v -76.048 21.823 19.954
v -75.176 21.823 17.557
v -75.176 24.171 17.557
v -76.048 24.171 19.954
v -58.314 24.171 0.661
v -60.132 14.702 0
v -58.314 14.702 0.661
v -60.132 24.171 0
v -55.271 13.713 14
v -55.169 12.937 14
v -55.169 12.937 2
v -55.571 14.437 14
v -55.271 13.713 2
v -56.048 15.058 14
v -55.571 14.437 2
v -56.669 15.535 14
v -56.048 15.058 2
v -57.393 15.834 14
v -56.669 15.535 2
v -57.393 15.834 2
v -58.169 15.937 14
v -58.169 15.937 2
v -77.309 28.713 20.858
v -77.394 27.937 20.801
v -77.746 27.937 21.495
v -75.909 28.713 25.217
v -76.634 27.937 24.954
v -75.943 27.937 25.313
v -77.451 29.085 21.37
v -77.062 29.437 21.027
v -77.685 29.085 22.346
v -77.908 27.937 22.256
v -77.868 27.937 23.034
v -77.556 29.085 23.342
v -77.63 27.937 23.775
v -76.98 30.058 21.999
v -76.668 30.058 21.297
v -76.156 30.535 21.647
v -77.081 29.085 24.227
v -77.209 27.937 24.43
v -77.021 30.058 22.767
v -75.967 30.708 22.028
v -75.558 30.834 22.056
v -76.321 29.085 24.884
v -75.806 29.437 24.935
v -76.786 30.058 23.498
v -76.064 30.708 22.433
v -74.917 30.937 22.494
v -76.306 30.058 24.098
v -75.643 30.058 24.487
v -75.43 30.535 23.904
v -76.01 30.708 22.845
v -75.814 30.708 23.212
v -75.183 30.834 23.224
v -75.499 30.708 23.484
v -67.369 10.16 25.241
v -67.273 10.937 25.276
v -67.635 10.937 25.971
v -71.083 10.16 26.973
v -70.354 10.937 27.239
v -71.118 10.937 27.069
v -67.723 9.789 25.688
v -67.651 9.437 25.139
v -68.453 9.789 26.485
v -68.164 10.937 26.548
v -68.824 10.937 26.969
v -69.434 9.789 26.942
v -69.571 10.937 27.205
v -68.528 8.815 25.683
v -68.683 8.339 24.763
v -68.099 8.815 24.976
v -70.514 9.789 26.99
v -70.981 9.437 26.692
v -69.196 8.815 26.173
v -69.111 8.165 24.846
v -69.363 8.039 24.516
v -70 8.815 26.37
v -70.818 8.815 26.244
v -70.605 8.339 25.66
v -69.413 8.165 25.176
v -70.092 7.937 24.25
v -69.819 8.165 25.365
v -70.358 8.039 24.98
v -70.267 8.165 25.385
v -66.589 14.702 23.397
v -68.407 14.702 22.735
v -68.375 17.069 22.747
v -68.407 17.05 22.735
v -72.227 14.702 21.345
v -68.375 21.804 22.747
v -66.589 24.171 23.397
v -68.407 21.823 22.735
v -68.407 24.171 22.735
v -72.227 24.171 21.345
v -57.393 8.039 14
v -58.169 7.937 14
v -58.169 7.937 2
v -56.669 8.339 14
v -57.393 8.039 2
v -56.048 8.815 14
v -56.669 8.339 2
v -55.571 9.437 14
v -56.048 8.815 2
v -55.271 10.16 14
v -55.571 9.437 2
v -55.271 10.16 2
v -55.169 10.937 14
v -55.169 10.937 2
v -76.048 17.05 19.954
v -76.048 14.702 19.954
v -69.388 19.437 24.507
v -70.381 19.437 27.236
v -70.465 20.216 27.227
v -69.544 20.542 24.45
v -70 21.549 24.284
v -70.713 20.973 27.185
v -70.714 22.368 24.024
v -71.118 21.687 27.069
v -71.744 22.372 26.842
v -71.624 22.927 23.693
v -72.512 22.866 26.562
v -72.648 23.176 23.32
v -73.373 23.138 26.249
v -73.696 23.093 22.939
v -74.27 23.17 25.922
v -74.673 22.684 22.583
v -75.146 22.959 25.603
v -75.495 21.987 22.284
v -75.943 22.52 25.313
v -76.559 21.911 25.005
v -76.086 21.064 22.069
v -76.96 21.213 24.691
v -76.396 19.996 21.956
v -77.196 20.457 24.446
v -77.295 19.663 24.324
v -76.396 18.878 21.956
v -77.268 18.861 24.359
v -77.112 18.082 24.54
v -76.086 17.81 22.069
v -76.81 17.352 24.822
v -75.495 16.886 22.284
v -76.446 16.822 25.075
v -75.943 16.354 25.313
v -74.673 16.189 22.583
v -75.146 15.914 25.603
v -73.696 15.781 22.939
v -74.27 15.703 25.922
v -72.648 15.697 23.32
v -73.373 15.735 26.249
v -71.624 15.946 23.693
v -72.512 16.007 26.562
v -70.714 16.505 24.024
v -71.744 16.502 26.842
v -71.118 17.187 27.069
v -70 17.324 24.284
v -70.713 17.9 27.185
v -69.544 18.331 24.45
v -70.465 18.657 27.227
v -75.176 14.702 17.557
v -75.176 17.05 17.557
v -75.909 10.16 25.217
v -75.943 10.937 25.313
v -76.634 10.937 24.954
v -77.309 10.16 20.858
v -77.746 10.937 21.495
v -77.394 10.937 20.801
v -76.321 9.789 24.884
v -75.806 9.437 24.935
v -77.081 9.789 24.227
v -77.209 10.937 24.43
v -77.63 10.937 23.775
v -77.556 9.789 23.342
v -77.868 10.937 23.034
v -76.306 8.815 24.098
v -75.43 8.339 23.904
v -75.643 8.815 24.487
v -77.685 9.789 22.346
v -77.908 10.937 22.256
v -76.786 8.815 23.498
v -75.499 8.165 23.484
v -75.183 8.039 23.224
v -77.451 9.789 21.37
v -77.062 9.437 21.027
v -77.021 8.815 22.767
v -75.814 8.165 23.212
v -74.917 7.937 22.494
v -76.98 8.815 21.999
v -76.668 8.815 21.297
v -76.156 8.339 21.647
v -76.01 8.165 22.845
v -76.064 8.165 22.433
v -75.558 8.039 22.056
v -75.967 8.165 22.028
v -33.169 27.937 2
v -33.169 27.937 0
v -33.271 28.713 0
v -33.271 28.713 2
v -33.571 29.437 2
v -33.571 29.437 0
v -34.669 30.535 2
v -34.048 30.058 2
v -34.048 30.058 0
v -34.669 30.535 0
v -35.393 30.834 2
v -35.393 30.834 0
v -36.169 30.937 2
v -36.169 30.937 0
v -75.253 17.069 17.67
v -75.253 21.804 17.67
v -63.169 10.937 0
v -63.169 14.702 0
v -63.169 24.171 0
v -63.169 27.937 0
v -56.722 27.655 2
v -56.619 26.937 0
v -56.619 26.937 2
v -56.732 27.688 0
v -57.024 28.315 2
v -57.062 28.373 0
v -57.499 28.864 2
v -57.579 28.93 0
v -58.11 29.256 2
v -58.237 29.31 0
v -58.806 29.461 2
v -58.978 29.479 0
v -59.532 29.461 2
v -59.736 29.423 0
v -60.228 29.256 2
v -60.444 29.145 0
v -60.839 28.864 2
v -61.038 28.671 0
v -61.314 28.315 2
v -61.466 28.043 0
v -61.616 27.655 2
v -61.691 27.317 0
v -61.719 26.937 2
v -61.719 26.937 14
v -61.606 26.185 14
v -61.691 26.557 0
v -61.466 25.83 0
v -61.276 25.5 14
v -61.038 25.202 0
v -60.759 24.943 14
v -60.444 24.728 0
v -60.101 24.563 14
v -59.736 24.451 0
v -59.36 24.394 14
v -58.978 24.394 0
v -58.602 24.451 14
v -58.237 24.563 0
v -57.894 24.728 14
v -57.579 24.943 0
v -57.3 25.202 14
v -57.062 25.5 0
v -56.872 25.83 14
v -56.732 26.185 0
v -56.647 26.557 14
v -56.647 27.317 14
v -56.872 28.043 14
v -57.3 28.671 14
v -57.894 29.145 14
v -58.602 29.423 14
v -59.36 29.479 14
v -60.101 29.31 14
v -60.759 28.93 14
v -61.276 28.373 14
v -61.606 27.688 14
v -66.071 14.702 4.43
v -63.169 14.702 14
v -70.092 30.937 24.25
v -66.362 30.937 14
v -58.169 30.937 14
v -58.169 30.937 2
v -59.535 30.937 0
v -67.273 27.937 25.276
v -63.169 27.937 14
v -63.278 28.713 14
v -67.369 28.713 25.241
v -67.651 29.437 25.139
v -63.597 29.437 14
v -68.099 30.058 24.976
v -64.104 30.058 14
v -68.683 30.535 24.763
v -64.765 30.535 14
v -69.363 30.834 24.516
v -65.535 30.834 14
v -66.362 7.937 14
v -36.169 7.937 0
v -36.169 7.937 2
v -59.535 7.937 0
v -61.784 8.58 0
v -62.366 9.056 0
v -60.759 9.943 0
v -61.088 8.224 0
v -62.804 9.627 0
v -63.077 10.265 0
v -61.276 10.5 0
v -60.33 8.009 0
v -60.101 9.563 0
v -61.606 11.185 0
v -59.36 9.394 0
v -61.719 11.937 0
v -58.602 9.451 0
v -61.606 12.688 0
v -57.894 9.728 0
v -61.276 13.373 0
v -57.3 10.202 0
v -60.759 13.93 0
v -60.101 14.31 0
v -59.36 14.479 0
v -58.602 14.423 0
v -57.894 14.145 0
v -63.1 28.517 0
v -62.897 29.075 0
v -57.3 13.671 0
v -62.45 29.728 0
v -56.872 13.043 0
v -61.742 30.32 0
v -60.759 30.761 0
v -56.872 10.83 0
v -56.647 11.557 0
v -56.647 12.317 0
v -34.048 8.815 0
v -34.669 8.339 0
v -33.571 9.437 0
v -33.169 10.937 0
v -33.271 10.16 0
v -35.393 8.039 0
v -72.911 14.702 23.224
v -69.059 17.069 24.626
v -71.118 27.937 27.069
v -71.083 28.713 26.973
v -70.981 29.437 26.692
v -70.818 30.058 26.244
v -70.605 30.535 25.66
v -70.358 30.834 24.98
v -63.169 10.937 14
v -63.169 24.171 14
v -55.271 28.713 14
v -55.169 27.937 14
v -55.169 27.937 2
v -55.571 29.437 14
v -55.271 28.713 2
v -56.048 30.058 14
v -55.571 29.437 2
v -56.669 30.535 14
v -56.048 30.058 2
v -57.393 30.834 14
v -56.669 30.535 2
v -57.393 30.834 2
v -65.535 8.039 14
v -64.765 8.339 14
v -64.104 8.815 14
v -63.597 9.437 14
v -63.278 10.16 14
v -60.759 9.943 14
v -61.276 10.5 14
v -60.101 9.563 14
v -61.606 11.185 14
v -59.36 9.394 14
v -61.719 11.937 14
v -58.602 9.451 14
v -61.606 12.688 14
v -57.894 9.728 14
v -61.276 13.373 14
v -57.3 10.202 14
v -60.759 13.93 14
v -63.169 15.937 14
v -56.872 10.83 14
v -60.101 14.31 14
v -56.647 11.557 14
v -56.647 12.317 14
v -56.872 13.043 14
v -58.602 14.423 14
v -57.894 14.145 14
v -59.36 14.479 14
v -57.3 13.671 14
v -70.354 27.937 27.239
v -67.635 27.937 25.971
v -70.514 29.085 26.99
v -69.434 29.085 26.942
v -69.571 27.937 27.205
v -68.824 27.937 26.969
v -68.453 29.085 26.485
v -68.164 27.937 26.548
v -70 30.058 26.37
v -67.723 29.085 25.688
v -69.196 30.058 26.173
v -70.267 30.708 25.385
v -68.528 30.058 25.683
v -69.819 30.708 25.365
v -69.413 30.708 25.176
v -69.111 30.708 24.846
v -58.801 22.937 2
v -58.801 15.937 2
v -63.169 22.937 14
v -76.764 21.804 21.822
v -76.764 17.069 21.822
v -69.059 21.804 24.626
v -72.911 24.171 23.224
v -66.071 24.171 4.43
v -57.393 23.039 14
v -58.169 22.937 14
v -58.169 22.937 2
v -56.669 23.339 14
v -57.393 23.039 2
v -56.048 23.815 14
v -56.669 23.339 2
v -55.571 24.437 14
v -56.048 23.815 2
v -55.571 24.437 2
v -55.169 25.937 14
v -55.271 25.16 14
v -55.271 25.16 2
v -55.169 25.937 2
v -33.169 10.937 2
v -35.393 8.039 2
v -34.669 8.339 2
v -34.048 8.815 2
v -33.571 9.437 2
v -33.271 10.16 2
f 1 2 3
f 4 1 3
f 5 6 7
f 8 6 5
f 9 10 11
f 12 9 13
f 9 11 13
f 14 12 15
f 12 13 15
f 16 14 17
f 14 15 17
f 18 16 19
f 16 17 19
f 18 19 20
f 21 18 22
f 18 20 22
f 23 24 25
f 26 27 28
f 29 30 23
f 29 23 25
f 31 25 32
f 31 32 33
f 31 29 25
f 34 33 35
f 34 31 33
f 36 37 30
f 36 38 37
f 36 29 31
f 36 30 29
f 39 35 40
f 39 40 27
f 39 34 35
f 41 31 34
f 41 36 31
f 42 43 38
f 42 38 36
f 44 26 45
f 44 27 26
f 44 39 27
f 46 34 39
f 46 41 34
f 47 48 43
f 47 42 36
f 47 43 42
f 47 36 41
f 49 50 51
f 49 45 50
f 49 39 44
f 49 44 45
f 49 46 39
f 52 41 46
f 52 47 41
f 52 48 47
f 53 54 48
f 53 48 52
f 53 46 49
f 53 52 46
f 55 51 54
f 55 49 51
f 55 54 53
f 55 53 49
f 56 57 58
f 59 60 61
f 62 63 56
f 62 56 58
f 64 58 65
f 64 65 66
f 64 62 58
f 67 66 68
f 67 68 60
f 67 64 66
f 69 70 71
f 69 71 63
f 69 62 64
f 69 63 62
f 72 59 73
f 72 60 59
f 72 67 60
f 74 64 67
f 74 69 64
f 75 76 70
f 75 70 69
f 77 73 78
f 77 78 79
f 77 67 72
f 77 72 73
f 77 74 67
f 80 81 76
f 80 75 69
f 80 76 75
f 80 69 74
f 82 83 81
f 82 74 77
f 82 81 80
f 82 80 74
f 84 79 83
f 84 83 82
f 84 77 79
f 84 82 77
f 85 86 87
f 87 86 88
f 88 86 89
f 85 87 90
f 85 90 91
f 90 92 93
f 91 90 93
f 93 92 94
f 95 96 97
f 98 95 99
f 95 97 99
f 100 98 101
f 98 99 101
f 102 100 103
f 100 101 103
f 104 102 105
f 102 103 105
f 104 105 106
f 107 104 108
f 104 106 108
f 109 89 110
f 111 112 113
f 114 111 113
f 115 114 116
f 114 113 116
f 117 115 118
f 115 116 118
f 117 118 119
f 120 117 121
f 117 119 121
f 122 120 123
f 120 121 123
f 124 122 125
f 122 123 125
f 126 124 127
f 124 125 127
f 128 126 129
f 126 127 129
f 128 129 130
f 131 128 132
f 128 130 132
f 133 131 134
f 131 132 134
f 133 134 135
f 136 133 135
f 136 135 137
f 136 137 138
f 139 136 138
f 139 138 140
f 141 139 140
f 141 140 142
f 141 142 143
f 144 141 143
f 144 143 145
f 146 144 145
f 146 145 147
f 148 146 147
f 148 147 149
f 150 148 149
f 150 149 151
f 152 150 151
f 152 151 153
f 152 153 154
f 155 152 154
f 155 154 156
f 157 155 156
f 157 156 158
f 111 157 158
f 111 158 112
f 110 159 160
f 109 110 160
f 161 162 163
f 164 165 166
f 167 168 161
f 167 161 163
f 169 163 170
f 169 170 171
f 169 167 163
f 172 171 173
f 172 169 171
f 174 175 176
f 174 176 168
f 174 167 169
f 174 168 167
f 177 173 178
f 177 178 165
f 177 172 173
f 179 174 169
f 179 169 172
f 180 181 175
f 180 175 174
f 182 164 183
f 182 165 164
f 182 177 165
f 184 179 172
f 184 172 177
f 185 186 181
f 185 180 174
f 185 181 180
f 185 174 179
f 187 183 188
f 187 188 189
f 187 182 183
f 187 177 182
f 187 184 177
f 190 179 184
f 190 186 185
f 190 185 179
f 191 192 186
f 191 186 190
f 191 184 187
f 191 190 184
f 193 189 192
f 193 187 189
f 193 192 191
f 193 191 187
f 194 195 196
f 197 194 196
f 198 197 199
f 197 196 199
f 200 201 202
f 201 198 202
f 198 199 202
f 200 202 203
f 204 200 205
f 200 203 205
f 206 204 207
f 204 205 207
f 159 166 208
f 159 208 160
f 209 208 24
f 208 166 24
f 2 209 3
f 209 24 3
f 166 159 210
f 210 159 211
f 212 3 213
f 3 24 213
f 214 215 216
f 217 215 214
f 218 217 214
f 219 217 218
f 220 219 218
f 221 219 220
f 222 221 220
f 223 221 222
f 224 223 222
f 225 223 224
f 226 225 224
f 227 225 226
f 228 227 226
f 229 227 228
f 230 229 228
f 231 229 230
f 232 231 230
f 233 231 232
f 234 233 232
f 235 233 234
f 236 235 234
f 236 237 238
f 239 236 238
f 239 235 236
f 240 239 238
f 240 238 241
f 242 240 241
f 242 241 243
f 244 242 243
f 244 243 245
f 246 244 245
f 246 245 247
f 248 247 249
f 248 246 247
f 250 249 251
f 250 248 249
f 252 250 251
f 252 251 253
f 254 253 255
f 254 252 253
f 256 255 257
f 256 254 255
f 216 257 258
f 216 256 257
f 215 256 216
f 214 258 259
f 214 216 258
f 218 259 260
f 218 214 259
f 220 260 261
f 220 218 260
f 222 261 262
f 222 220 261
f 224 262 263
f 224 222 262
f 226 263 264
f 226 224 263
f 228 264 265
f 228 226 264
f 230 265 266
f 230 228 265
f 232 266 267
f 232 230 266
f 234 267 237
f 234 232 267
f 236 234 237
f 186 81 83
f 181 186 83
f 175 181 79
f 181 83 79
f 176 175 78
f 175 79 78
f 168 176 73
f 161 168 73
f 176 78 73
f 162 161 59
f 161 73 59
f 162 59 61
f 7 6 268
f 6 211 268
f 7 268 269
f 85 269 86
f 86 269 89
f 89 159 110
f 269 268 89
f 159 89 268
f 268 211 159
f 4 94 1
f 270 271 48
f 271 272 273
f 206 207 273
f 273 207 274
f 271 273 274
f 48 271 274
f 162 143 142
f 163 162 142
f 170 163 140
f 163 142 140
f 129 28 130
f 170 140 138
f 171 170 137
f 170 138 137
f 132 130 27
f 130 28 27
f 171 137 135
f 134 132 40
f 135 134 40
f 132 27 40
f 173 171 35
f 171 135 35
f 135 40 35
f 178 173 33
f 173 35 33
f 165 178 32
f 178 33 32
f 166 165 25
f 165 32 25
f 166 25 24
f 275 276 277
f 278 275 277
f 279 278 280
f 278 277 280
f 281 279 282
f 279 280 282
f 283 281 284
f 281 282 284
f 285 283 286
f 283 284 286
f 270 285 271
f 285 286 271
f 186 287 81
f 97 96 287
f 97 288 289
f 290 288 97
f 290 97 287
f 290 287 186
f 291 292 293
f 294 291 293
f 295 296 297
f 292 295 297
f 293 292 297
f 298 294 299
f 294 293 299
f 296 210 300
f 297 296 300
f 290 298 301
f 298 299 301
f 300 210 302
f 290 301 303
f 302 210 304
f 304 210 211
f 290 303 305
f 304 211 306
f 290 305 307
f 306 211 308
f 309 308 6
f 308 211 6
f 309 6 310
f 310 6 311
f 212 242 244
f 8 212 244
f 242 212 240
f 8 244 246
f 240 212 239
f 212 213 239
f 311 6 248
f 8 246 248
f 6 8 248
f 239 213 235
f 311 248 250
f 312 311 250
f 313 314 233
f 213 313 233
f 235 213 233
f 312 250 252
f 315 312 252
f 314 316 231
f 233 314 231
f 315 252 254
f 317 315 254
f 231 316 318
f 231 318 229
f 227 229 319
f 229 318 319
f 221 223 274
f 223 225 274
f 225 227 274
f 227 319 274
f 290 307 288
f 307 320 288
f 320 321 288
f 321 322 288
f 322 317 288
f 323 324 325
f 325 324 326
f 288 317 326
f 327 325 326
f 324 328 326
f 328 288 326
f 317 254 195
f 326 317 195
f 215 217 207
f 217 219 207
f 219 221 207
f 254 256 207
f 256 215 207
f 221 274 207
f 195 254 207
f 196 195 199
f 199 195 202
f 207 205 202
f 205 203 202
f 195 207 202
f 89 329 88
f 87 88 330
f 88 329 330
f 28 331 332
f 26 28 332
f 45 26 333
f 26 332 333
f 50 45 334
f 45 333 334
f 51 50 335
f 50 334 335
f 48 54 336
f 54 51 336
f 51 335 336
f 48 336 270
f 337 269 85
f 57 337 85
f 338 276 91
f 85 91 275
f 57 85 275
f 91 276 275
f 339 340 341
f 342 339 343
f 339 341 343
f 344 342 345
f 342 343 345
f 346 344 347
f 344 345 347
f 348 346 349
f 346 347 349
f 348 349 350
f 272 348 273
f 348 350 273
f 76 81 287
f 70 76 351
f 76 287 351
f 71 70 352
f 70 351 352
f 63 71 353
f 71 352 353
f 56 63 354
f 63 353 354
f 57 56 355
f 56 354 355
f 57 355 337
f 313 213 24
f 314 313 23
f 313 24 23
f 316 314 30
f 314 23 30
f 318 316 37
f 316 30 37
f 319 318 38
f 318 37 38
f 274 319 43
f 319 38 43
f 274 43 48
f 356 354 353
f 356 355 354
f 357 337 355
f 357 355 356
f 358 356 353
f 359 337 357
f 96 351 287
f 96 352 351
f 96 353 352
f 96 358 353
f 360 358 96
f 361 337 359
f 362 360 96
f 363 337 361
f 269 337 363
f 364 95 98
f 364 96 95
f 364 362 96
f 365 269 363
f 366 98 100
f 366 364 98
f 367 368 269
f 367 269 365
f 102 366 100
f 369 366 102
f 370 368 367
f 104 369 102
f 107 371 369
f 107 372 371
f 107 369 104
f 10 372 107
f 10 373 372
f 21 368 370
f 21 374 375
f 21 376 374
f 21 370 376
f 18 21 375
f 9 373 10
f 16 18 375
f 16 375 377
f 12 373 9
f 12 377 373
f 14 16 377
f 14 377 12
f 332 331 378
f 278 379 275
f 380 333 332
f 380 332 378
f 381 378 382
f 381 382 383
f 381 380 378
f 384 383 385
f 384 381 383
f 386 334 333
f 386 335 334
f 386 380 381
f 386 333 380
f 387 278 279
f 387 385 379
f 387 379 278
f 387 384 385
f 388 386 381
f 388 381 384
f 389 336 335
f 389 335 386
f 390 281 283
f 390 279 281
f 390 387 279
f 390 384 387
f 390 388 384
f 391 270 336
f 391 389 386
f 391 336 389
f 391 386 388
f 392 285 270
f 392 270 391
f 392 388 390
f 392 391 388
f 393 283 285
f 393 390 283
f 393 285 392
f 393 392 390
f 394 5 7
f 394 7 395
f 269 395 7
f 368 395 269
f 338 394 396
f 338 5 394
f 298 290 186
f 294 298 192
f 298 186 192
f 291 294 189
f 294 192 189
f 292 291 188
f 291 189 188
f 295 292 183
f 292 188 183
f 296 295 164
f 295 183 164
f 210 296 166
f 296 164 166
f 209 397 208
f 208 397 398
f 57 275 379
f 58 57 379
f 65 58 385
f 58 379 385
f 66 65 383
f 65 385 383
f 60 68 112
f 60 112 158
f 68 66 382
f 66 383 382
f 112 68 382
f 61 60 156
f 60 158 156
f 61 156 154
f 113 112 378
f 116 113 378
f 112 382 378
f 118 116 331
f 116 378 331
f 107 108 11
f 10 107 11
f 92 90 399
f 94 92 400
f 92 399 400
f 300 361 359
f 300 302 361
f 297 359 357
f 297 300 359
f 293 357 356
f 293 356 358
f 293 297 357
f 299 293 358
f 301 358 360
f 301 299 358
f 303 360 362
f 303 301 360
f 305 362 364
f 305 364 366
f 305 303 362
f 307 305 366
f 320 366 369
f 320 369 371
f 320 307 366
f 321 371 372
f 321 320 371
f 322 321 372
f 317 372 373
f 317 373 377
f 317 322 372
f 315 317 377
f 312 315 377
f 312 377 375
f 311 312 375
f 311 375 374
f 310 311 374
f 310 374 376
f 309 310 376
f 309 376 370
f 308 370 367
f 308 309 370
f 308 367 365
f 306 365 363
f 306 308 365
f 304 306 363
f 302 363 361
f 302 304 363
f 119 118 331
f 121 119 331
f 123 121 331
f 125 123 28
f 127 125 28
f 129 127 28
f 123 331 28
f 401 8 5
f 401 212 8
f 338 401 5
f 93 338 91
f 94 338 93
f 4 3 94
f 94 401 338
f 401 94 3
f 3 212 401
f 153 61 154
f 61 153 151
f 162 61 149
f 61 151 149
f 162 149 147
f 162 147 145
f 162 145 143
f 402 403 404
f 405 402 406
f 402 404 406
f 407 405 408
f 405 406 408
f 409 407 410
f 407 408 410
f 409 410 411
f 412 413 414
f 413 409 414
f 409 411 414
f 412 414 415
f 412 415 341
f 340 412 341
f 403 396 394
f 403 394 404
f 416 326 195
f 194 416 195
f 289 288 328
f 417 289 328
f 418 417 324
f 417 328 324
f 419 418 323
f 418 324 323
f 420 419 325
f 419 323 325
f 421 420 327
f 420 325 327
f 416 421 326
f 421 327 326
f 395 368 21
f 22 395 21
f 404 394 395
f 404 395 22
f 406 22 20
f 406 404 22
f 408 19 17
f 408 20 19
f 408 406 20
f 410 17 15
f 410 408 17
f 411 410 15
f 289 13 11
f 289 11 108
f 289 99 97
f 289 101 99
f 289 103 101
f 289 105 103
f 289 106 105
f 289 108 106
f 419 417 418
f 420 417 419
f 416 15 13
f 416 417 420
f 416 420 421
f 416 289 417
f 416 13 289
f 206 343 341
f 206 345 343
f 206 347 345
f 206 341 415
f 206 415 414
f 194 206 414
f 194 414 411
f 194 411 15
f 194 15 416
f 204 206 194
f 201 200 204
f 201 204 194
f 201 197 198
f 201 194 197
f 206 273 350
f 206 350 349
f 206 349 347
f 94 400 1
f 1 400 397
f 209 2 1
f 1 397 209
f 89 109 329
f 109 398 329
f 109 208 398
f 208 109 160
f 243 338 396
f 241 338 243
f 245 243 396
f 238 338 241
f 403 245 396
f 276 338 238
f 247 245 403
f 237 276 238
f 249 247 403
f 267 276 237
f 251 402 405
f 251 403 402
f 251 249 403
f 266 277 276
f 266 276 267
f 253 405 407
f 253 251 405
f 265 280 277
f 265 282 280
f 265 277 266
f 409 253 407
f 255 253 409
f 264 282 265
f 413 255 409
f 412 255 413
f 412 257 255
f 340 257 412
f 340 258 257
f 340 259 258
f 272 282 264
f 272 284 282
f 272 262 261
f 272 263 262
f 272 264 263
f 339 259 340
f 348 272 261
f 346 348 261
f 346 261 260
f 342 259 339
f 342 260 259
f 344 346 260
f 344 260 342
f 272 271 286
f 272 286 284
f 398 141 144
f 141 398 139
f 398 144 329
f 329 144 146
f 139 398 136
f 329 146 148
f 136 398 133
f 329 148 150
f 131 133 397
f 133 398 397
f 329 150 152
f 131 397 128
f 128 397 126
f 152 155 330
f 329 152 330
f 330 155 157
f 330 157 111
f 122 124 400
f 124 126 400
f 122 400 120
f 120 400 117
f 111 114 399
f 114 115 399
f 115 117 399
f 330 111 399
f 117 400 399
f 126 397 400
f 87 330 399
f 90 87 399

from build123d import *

# Parameters (mm, degrees)
CROQUIS3_W              = 30
CROQUIS3_H              = 23
CROQUIS3_R              = 2.55
SALIENTE_EXTRUIR2_DEPTH = 2
CROQUIS5_W              = 8
CROQUIS5_H              = 8
CROQUIS5_R              = 2.55
SALIENTE_EXTRUIR3_DEPTH = 12
SALIENTE_EXTRUIR4_DEPTH = 23
CROQUIS7_R              = 3.75
CORTAR_EXTRUIR1_DEPTH   = 15
CORTAR_EXTRUIR7_START   = -3
CORTAR_EXTRUIR7_DEPTH   = 20
CORTAR_EXTRUIR8_START   = 2
CROQUIS14_W             = 8.13201816
CROQUIS14_H             = 9.468544415
CORTAR_EXTRUIR8_DEPTH   = 25
CROQUIS15_W             = 24.194573687
CROQUIS15_H             = 9.468544415
CORTAR_EXTRUIR9_DEPTH   = 1.933991
REDONDEO1_R             = 3


with BuildPart() as part:
    # Croquis3 → Saliente-Extruir2 (new body)
    with BuildSketch(Plane.XY):
        with Locations((-48.169014085, 19.436619718)):
            Rectangle(CROQUIS3_W, CROQUIS3_H)
        with Locations((-59.169014085, 26.936619718)):
            Circle(CROQUIS3_R, mode=Mode.SUBTRACT)
        with Locations(Location((-59.169014085, 11.936619718, 0), (0, 0, 180))):
            Circle(CROQUIS3_R, mode=Mode.SUBTRACT)
    extrude(amount=SALIENTE_EXTRUIR2_DEPTH)

    # Croquis5 → Saliente-Extruir3 (add)
    # profile 1 of 2: a face of its own
    with BuildSketch(Plane.XY.offset(2)):
        with Locations((-59.169014085, 11.936619718)):
            Rectangle(CROQUIS5_W, CROQUIS5_H)
        with Locations(Location((-59.169014085, 11.936619718, 0), (0, 0, 180))):
            Circle(CROQUIS5_R, mode=Mode.SUBTRACT)
    # profile 2 of 2: a face of its own
    with BuildSketch(Plane.XY.offset(2)):
        with Locations((-59.169014085, 26.936619718)):
            Rectangle(CROQUIS5_W, CROQUIS5_H)
        with Locations(Location((-59.169014085, 26.936619718, 0), (0, 0, 180))):
            Circle(CROQUIS5_R, mode=Mode.SUBTRACT)
    extrude(amount=SALIENTE_EXTRUIR3_DEPTH)

    # Croquis6 → Saliente-Extruir4 (add)
    with BuildSketch(Plane(origin=(0, 30.936619718, 0), x_dir=(1, 0, 0), z_dir=(0, 1, 0))):
        Polygon((-63.169014085, -14), (-68.299316234, -28.095389312), (-79.575627684, -23.991147592), (-63.169014085, 0), align=None)
    extrude(amount=-SALIENTE_EXTRUIR4_DEPTH)

    # Croquis7 → Cortar-Extruir1 (cut)
    with BuildSketch(Plane(origin=(-17.019186352, 0, 46.759830198), x_dir=(0.9396926207859082, 0, 0.3420201433256694), z_dir=(-0.3420201433256694, 0, 0.9396926207859083))):
        with Locations((-60.571174391, 19.436619718)):
            Circle(CROQUIS7_R)
    extrude(amount=-CORTAR_EXTRUIR1_DEPTH, mode=Mode.SUBTRACT)

    # Croquis13 → Cortar-Extruir7 (cut)
    with BuildSketch(Plane(origin=(-17.019186352, 0, 46.759830198), x_dir=(0.9396926207859082, 0, 0.3420201433256694), z_dir=(-0.3420201433256694, 0, 0.9396926207859083)).offset(CORTAR_EXTRUIR7_START)):
        Polygon((-60.571174391, 14.702347511), (-56.471174391, 17.069483615), (-56.471174391, 21.803755822), (-60.571174391, 24.170891926), (-64.671174391, 21.803755822), (-64.671174391, 17.069483615), align=None)
    extrude(amount=-CORTAR_EXTRUIR7_DEPTH, mode=Mode.SUBTRACT)

    # Croquis14 → Cortar-Extruir8 (cut)
    with BuildSketch(Plane(origin=(-15.993125922, 0, 43.940752336), x_dir=(-0.9396926207859081, 0, -0.34202014332566977), z_dir=(0.3420201433256697, 0, -0.939692620785908)).offset(CORTAR_EXTRUIR8_START)):
        with Locations((60.571174391, 19.436619719)):
            Rectangle(CROQUIS14_W, CROQUIS14_H)
    extrude(amount=CORTAR_EXTRUIR8_DEPTH, mode=Mode.SUBTRACT)

    # Croquis15 → Cortar-Extruir9 (cut)
    with BuildSketch(Plane(origin=(-53.097486879, 0, -19.325904738), x_dir=(-0.34202014332566977, 0, 0.9396926207859081), z_dir=(-0.939692620785908, 0, -0.3420201433256697))):
        with Locations((32.663485099, 19.436619719)):
            Rectangle(CROQUIS15_W, CROQUIS15_H)
    extrude(amount=-CORTAR_EXTRUIR9_DEPTH, mode=Mode.SUBTRACT)

    # Redondeo1
    # the kernel refuses this fillet: 3 mm, written as the material it takes off along each edge
    with BuildSketch(Plane(origin=(-70.092333667, 10.936619718, 24.250251019), x_dir=(0.9396926207859081, 0, 0.34202014332566966), z_dir=(0, -1, 0))) as redondeo1_piece_1_section:
        Polygon((0, 0), (REDONDEO1_R * 1.02, 0), (REDONDEO1_R * 1.02, REDONDEO1_R * 1.02), (0, REDONDEO1_R * 1.02), align=None)
    redondeo1_piece_1 = extrude(amount=REDONDEO1_R * 1.02, mode=Mode.PRIVATE)
    redondeo1_piece_1 = redondeo1_piece_1 - Plane(origin=(-70.092333667, 10.936619718, 24.250251019), x_dir=(-0.4226182617406987, 0, -0.9063077870366504), z_dir=(0, -1, 0)) * Sphere(REDONDEO1_R, mode=Mode.PRIVATE)
    add(redondeo1_piece_1, mode=Mode.SUBTRACT)
    with BuildSketch(Plane(origin=(-74.917413437, 10.936619718, 22.494065605), x_dir=(-0.3420201433256695, 0, 0.9396926207859081), z_dir=(0, -1, 0))) as redondeo1_piece_2_section:
        Polygon((0, 0), (REDONDEO1_R * 1.02, 0), (REDONDEO1_R * 1.02, REDONDEO1_R * 1.31418750187), (-REDONDEO1_R * 0.253089576506, REDONDEO1_R * 0.988102052555), align=None)
    redondeo1_piece_2 = extrude(amount=REDONDEO1_R * 1.02, mode=Mode.PRIVATE)
    redondeo1_piece_2 = redondeo1_piece_2 - Plane(origin=(-74.917413437, 10.936619718, 22.494065605), x_dir=(0.9520405381935744, 0, -0.30597191641732324), z_dir=(0, -1, 0)) * Sphere(REDONDEO1_R, mode=Mode.PRIVATE)
    add(redondeo1_piece_2, mode=Mode.SUBTRACT)
    with BuildSketch(Plane(origin=(-70.092333667, 27.936619718, 24.250251019), x_dir=(0.9396926207859081, 0, 0.34202014332566966), z_dir=(0, 1, 0))) as redondeo1_piece_3_section:
        Polygon((0, 0), (REDONDEO1_R * 1.02, 0), (REDONDEO1_R * 1.02, -REDONDEO1_R * 1.02), (0, -REDONDEO1_R * 1.02), align=None)
    redondeo1_piece_3 = extrude(amount=REDONDEO1_R * 1.02, mode=Mode.PRIVATE)
    redondeo1_piece_3 = redondeo1_piece_3 - Plane(origin=(-70.092333667, 27.936619718, 24.250251019), x_dir=(-0.4226182617406987, 0, -0.9063077870366504), z_dir=(0, 1, 0)) * Sphere(REDONDEO1_R, mode=Mode.PRIVATE)
    add(redondeo1_piece_3, mode=Mode.SUBTRACT)
    with BuildSketch(Plane(origin=(-74.917413437, 27.936619718, 22.494065605), x_dir=(-0.3420201433256695, 0, 0.9396926207859081), z_dir=(0, 1, 0))) as redondeo1_piece_4_section:
        Polygon((0, 0), (REDONDEO1_R * 1.02, 0), (REDONDEO1_R * 1.02, -REDONDEO1_R * 1.31418750187), (-REDONDEO1_R * 0.253089576506, -REDONDEO1_R * 0.988102052555), align=None)
    redondeo1_piece_4 = extrude(amount=REDONDEO1_R * 1.02, mode=Mode.PRIVATE)
    redondeo1_piece_4 = redondeo1_piece_4 - Plane(origin=(-74.917413437, 27.936619718, 22.494065605), x_dir=(0.9520405381935744, 0, -0.30597191641732324), z_dir=(0, 1, 0)) * Sphere(REDONDEO1_R, mode=Mode.PRIVATE)
    add(redondeo1_piece_4, mode=Mode.SUBTRACT)
    with BuildSketch(Plane(origin=(-55.169014085, 7.936619718, 2), x_dir=(0, 1, 0), z_dir=(0, 0, 1)), Plane(origin=(-55.169014085, 15.936619718, 2), x_dir=(-1, 0, 0), z_dir=(0, 0, 1)), Plane(origin=(-55.169014085, 30.936619718, 2), x_dir=(-1, 0, 0), z_dir=(0, 0, 1))) as redondeo1_piece_5:
        with BuildLine():
            CenterArc((REDONDEO1_R, REDONDEO1_R), REDONDEO1_R, 180, 90)
            Line((0, REDONDEO1_R), (0, 0))
            Line((0, 0), (REDONDEO1_R, 0))
        make_face()
    extrude(amount=19.5, mode=Mode.SUBTRACT)
    with BuildSketch(Plane(origin=(-55.169014085, 22.936619718, 2), x_dir=(-1, 0, 0), z_dir=(0, 0, 1))) as redondeo1_piece_6:
        with BuildLine():
            CenterArc((REDONDEO1_R, -REDONDEO1_R), REDONDEO1_R, 90, 90)
            Line((0, -REDONDEO1_R), (0, 0))
            Line((0, 0), (REDONDEO1_R, 0))
        make_face()
    extrude(amount=19.5, mode=Mode.SUBTRACT)
    with BuildSketch(Plane(origin=(-60.60386301, 7.936619718, 6.952305344), x_dir=(0, 1, 0), z_dir=(-0.34202014332566966, 0, 0.9396926207859081))) as redondeo1_piece_7_section:
        with BuildLine():
            CenterArc((REDONDEO1_R, REDONDEO1_R), REDONDEO1_R, 180, 90)
            Line((0, REDONDEO1_R), (0, 0))
            Line((0, 0), (REDONDEO1_R, 0))
        make_face()
    redondeo1_piece_7 = extrude(amount=19.5, mode=Mode.PRIVATE)
    redondeo1_piece_7 = split(redondeo1_piece_7, bisect_by=Plane(origin=(-65.882719938, 8.612486754, 14), z_dir=(0, 0, 1)), keep=Keep.TOP, mode=Mode.PRIVATE)
    add(redondeo1_piece_7, mode=Mode.SUBTRACT)
    with BuildSketch(Plane(origin=(-71.118394097, 7.936619718, 27.069328882), x_dir=(0.3420201433256695, 0, -0.9396926207859081), z_dir=(-0.9396926207859081, 0, -0.3420201433256695))) as redondeo1_piece_8:
        with BuildLine():
            CenterArc((REDONDEO1_R, -REDONDEO1_R), REDONDEO1_R, 90, 90)
            Line((0, -REDONDEO1_R), (0, 0))
            Line((0, 0), (REDONDEO1_R, 0))
        make_face()
    extrude(amount=5.134742642, mode=Mode.SUBTRACT)
    with BuildSketch(Plane(origin=(-68.299316234, 27.936619718, 28.095389312), x_dir=(0.34202014332566905, 0, -0.9396926207859082), z_dir=(0, -1, 0)), Plane(origin=(-33.169014085, 7.936619718, -7.5), x_dir=(-1, 0, 0), z_dir=(0, 0, 1))) as redondeo1_piece_9:
        with BuildLine():
            CenterArc((REDONDEO1_R, -REDONDEO1_R), REDONDEO1_R, 90, 90)
            Line((0, -REDONDEO1_R), (0, 0))
            Line((0, 0), (REDONDEO1_R, 0))
        make_face()
    extrude(amount=17, mode=Mode.SUBTRACT)
    with BuildSketch(Plane(origin=(-77.393738361, 7.936619718, 20.800603214), x_dir=(0.8254416413123481, 0, 0.5644874638001954), z_dir=(0.5644874638001954, 0, -0.8254416413123482))) as redondeo1_piece_10:
        with BuildLine():
            CenterArc((REDONDEO1_R, -REDONDEO1_R), REDONDEO1_R, 90, 90)
            Line((0, -REDONDEO1_R), (0, 0))
            Line((0, 0), (REDONDEO1_R, 0))
        make_face()
    extrude(amount=32.699362587, mode=Mode.SUBTRACT)
    with BuildSketch(Plane(origin=(-79.575627684, 27.936619718, 23.991147592), x_dir=(0.9396926207859081, 0, 0.3420201433256696), z_dir=(0, -1, 0))) as redondeo1_piece_11:
        with BuildLine():
            CenterArc((REDONDEO1_R * 1.28841911948, -REDONDEO1_R), REDONDEO1_R, 90, 104.366707449)
            Line((REDONDEO1_R * 0.319691616972, -REDONDEO1_R * 1.24812703579), (0, 0))
            Line((0, 0), (REDONDEO1_R * 1.28841911948, 0))
        make_face()
    extrude(amount=17, mode=Mode.SUBTRACT)
    with BuildSketch(Plane(origin=(-77.393738361, 30.936619718, 20.800603214), x_dir=(0.8254416413123481, 0, 0.5644874638001954), z_dir=(0.5644874638001954, 0, -0.8254416413123482))) as redondeo1_piece_12:
        with BuildLine():
            CenterArc((REDONDEO1_R, REDONDEO1_R), REDONDEO1_R, 180, 90)
            Line((0, REDONDEO1_R), (0, 0))
            Line((0, 0), (REDONDEO1_R, 0))
        make_face()
    extrude(amount=32.699362587, mode=Mode.SUBTRACT)
    with BuildSketch(Plane(origin=(-71.118394097, 30.936619718, 27.069328882), x_dir=(0.3420201433256695, 0, -0.9396926207859081), z_dir=(-0.9396926207859081, 0, -0.3420201433256695))) as redondeo1_piece_13:
        with BuildLine():
            CenterArc((REDONDEO1_R, REDONDEO1_R), REDONDEO1_R, 180, 90)
            Line((0, REDONDEO1_R), (0, 0))
            Line((0, 0), (REDONDEO1_R, 0))
        make_face()
    extrude(amount=5.134742642, mode=Mode.SUBTRACT)
    with BuildSketch(Plane(origin=(-60.60386301, 30.936619718, 6.952305344), x_dir=(-0.9396926207859081, 0, -0.3420201433256697), z_dir=(-0.34202014332566966, 0, 0.9396926207859081))) as redondeo1_piece_14_section:
        with BuildLine():
            CenterArc((REDONDEO1_R, REDONDEO1_R), REDONDEO1_R, 180, 90)
            Line((0, REDONDEO1_R), (0, 0))
            Line((0, 0), (REDONDEO1_R, 0))
        make_face()
    redondeo1_piece_14 = extrude(amount=19.5, mode=Mode.PRIVATE)
    redondeo1_piece_14 = split(redondeo1_piece_14, bisect_by=Plane(origin=(-65.882719938, 30.260752682, 14), z_dir=(0, 0, 1)), keep=Keep.TOP, mode=Mode.PRIVATE)
    add(redondeo1_piece_14, mode=Mode.SUBTRACT)
    with BuildSketch(Plane(origin=(-33.169014085, 30.936619718, -7.5), x_dir=(-1, 0, 0), z_dir=(0, 0, 1))) as redondeo1_piece_15:
        with BuildLine():
            CenterArc((REDONDEO1_R, REDONDEO1_R), REDONDEO1_R, 180, 90)
            Line((0, REDONDEO1_R), (0, 0))
            Line((0, 0), (REDONDEO1_R, 0))
        make_face()
    extrude(amount=17, mode=Mode.SUBTRACT)


solid = part.part
